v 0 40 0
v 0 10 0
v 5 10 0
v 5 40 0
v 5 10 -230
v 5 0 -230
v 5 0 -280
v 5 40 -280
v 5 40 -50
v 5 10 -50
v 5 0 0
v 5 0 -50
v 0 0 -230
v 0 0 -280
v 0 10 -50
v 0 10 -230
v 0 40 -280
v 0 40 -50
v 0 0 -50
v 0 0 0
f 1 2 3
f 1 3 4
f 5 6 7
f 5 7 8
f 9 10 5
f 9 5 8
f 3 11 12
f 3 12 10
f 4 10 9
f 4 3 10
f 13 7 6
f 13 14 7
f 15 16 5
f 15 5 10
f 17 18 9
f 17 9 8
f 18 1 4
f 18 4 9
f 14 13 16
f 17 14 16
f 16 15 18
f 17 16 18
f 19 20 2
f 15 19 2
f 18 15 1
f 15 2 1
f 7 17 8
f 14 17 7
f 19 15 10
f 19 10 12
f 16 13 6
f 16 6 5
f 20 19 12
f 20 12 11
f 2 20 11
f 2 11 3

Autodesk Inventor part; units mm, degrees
ref_plane "YZ Plane" through (0, 0, 0) normal (1, 0, 0) x (0, 1, 0)
ref_plane "XZ Plane" through (0, 0, 0) normal (0, 1, 0) x (-1, 0, 0)
ref_plane "XY Plane" through (0, 0, 0) normal (0, 0, 1) x (1, 0, 0)
sketch "Sketch1" plane through (0, 0, 0) normal (1, 0, 0) x (0, 1, 0)
  line L0 (0, 0) -> (40, 0)
  line L1 (40, 0) -> (40, -50)
  line L2 (0, 0) -> (10, 0)
  line L3 (10, -50) -> (0, -50)
  line L4 (0, -50) -> (0, 0)
  line L5 (40, -50) -> (40, -280)
  line L6 (40, -280) -> (0, -280)
  line L7 (0, -280) -> (0, -230)
  line L8 (0, -230) -> (10, -230)
  line L9 (10, -230) -> (10, -50)
  dimension "d0" = 40
  dimension "d1" = 50
  dimension "d3" = 230
  dimension "d4" = 50
  dimension "d5" = 10
extrude "Extrusion1" add sketch "Sketch1" along normal blind 5
properties part number "cover"
